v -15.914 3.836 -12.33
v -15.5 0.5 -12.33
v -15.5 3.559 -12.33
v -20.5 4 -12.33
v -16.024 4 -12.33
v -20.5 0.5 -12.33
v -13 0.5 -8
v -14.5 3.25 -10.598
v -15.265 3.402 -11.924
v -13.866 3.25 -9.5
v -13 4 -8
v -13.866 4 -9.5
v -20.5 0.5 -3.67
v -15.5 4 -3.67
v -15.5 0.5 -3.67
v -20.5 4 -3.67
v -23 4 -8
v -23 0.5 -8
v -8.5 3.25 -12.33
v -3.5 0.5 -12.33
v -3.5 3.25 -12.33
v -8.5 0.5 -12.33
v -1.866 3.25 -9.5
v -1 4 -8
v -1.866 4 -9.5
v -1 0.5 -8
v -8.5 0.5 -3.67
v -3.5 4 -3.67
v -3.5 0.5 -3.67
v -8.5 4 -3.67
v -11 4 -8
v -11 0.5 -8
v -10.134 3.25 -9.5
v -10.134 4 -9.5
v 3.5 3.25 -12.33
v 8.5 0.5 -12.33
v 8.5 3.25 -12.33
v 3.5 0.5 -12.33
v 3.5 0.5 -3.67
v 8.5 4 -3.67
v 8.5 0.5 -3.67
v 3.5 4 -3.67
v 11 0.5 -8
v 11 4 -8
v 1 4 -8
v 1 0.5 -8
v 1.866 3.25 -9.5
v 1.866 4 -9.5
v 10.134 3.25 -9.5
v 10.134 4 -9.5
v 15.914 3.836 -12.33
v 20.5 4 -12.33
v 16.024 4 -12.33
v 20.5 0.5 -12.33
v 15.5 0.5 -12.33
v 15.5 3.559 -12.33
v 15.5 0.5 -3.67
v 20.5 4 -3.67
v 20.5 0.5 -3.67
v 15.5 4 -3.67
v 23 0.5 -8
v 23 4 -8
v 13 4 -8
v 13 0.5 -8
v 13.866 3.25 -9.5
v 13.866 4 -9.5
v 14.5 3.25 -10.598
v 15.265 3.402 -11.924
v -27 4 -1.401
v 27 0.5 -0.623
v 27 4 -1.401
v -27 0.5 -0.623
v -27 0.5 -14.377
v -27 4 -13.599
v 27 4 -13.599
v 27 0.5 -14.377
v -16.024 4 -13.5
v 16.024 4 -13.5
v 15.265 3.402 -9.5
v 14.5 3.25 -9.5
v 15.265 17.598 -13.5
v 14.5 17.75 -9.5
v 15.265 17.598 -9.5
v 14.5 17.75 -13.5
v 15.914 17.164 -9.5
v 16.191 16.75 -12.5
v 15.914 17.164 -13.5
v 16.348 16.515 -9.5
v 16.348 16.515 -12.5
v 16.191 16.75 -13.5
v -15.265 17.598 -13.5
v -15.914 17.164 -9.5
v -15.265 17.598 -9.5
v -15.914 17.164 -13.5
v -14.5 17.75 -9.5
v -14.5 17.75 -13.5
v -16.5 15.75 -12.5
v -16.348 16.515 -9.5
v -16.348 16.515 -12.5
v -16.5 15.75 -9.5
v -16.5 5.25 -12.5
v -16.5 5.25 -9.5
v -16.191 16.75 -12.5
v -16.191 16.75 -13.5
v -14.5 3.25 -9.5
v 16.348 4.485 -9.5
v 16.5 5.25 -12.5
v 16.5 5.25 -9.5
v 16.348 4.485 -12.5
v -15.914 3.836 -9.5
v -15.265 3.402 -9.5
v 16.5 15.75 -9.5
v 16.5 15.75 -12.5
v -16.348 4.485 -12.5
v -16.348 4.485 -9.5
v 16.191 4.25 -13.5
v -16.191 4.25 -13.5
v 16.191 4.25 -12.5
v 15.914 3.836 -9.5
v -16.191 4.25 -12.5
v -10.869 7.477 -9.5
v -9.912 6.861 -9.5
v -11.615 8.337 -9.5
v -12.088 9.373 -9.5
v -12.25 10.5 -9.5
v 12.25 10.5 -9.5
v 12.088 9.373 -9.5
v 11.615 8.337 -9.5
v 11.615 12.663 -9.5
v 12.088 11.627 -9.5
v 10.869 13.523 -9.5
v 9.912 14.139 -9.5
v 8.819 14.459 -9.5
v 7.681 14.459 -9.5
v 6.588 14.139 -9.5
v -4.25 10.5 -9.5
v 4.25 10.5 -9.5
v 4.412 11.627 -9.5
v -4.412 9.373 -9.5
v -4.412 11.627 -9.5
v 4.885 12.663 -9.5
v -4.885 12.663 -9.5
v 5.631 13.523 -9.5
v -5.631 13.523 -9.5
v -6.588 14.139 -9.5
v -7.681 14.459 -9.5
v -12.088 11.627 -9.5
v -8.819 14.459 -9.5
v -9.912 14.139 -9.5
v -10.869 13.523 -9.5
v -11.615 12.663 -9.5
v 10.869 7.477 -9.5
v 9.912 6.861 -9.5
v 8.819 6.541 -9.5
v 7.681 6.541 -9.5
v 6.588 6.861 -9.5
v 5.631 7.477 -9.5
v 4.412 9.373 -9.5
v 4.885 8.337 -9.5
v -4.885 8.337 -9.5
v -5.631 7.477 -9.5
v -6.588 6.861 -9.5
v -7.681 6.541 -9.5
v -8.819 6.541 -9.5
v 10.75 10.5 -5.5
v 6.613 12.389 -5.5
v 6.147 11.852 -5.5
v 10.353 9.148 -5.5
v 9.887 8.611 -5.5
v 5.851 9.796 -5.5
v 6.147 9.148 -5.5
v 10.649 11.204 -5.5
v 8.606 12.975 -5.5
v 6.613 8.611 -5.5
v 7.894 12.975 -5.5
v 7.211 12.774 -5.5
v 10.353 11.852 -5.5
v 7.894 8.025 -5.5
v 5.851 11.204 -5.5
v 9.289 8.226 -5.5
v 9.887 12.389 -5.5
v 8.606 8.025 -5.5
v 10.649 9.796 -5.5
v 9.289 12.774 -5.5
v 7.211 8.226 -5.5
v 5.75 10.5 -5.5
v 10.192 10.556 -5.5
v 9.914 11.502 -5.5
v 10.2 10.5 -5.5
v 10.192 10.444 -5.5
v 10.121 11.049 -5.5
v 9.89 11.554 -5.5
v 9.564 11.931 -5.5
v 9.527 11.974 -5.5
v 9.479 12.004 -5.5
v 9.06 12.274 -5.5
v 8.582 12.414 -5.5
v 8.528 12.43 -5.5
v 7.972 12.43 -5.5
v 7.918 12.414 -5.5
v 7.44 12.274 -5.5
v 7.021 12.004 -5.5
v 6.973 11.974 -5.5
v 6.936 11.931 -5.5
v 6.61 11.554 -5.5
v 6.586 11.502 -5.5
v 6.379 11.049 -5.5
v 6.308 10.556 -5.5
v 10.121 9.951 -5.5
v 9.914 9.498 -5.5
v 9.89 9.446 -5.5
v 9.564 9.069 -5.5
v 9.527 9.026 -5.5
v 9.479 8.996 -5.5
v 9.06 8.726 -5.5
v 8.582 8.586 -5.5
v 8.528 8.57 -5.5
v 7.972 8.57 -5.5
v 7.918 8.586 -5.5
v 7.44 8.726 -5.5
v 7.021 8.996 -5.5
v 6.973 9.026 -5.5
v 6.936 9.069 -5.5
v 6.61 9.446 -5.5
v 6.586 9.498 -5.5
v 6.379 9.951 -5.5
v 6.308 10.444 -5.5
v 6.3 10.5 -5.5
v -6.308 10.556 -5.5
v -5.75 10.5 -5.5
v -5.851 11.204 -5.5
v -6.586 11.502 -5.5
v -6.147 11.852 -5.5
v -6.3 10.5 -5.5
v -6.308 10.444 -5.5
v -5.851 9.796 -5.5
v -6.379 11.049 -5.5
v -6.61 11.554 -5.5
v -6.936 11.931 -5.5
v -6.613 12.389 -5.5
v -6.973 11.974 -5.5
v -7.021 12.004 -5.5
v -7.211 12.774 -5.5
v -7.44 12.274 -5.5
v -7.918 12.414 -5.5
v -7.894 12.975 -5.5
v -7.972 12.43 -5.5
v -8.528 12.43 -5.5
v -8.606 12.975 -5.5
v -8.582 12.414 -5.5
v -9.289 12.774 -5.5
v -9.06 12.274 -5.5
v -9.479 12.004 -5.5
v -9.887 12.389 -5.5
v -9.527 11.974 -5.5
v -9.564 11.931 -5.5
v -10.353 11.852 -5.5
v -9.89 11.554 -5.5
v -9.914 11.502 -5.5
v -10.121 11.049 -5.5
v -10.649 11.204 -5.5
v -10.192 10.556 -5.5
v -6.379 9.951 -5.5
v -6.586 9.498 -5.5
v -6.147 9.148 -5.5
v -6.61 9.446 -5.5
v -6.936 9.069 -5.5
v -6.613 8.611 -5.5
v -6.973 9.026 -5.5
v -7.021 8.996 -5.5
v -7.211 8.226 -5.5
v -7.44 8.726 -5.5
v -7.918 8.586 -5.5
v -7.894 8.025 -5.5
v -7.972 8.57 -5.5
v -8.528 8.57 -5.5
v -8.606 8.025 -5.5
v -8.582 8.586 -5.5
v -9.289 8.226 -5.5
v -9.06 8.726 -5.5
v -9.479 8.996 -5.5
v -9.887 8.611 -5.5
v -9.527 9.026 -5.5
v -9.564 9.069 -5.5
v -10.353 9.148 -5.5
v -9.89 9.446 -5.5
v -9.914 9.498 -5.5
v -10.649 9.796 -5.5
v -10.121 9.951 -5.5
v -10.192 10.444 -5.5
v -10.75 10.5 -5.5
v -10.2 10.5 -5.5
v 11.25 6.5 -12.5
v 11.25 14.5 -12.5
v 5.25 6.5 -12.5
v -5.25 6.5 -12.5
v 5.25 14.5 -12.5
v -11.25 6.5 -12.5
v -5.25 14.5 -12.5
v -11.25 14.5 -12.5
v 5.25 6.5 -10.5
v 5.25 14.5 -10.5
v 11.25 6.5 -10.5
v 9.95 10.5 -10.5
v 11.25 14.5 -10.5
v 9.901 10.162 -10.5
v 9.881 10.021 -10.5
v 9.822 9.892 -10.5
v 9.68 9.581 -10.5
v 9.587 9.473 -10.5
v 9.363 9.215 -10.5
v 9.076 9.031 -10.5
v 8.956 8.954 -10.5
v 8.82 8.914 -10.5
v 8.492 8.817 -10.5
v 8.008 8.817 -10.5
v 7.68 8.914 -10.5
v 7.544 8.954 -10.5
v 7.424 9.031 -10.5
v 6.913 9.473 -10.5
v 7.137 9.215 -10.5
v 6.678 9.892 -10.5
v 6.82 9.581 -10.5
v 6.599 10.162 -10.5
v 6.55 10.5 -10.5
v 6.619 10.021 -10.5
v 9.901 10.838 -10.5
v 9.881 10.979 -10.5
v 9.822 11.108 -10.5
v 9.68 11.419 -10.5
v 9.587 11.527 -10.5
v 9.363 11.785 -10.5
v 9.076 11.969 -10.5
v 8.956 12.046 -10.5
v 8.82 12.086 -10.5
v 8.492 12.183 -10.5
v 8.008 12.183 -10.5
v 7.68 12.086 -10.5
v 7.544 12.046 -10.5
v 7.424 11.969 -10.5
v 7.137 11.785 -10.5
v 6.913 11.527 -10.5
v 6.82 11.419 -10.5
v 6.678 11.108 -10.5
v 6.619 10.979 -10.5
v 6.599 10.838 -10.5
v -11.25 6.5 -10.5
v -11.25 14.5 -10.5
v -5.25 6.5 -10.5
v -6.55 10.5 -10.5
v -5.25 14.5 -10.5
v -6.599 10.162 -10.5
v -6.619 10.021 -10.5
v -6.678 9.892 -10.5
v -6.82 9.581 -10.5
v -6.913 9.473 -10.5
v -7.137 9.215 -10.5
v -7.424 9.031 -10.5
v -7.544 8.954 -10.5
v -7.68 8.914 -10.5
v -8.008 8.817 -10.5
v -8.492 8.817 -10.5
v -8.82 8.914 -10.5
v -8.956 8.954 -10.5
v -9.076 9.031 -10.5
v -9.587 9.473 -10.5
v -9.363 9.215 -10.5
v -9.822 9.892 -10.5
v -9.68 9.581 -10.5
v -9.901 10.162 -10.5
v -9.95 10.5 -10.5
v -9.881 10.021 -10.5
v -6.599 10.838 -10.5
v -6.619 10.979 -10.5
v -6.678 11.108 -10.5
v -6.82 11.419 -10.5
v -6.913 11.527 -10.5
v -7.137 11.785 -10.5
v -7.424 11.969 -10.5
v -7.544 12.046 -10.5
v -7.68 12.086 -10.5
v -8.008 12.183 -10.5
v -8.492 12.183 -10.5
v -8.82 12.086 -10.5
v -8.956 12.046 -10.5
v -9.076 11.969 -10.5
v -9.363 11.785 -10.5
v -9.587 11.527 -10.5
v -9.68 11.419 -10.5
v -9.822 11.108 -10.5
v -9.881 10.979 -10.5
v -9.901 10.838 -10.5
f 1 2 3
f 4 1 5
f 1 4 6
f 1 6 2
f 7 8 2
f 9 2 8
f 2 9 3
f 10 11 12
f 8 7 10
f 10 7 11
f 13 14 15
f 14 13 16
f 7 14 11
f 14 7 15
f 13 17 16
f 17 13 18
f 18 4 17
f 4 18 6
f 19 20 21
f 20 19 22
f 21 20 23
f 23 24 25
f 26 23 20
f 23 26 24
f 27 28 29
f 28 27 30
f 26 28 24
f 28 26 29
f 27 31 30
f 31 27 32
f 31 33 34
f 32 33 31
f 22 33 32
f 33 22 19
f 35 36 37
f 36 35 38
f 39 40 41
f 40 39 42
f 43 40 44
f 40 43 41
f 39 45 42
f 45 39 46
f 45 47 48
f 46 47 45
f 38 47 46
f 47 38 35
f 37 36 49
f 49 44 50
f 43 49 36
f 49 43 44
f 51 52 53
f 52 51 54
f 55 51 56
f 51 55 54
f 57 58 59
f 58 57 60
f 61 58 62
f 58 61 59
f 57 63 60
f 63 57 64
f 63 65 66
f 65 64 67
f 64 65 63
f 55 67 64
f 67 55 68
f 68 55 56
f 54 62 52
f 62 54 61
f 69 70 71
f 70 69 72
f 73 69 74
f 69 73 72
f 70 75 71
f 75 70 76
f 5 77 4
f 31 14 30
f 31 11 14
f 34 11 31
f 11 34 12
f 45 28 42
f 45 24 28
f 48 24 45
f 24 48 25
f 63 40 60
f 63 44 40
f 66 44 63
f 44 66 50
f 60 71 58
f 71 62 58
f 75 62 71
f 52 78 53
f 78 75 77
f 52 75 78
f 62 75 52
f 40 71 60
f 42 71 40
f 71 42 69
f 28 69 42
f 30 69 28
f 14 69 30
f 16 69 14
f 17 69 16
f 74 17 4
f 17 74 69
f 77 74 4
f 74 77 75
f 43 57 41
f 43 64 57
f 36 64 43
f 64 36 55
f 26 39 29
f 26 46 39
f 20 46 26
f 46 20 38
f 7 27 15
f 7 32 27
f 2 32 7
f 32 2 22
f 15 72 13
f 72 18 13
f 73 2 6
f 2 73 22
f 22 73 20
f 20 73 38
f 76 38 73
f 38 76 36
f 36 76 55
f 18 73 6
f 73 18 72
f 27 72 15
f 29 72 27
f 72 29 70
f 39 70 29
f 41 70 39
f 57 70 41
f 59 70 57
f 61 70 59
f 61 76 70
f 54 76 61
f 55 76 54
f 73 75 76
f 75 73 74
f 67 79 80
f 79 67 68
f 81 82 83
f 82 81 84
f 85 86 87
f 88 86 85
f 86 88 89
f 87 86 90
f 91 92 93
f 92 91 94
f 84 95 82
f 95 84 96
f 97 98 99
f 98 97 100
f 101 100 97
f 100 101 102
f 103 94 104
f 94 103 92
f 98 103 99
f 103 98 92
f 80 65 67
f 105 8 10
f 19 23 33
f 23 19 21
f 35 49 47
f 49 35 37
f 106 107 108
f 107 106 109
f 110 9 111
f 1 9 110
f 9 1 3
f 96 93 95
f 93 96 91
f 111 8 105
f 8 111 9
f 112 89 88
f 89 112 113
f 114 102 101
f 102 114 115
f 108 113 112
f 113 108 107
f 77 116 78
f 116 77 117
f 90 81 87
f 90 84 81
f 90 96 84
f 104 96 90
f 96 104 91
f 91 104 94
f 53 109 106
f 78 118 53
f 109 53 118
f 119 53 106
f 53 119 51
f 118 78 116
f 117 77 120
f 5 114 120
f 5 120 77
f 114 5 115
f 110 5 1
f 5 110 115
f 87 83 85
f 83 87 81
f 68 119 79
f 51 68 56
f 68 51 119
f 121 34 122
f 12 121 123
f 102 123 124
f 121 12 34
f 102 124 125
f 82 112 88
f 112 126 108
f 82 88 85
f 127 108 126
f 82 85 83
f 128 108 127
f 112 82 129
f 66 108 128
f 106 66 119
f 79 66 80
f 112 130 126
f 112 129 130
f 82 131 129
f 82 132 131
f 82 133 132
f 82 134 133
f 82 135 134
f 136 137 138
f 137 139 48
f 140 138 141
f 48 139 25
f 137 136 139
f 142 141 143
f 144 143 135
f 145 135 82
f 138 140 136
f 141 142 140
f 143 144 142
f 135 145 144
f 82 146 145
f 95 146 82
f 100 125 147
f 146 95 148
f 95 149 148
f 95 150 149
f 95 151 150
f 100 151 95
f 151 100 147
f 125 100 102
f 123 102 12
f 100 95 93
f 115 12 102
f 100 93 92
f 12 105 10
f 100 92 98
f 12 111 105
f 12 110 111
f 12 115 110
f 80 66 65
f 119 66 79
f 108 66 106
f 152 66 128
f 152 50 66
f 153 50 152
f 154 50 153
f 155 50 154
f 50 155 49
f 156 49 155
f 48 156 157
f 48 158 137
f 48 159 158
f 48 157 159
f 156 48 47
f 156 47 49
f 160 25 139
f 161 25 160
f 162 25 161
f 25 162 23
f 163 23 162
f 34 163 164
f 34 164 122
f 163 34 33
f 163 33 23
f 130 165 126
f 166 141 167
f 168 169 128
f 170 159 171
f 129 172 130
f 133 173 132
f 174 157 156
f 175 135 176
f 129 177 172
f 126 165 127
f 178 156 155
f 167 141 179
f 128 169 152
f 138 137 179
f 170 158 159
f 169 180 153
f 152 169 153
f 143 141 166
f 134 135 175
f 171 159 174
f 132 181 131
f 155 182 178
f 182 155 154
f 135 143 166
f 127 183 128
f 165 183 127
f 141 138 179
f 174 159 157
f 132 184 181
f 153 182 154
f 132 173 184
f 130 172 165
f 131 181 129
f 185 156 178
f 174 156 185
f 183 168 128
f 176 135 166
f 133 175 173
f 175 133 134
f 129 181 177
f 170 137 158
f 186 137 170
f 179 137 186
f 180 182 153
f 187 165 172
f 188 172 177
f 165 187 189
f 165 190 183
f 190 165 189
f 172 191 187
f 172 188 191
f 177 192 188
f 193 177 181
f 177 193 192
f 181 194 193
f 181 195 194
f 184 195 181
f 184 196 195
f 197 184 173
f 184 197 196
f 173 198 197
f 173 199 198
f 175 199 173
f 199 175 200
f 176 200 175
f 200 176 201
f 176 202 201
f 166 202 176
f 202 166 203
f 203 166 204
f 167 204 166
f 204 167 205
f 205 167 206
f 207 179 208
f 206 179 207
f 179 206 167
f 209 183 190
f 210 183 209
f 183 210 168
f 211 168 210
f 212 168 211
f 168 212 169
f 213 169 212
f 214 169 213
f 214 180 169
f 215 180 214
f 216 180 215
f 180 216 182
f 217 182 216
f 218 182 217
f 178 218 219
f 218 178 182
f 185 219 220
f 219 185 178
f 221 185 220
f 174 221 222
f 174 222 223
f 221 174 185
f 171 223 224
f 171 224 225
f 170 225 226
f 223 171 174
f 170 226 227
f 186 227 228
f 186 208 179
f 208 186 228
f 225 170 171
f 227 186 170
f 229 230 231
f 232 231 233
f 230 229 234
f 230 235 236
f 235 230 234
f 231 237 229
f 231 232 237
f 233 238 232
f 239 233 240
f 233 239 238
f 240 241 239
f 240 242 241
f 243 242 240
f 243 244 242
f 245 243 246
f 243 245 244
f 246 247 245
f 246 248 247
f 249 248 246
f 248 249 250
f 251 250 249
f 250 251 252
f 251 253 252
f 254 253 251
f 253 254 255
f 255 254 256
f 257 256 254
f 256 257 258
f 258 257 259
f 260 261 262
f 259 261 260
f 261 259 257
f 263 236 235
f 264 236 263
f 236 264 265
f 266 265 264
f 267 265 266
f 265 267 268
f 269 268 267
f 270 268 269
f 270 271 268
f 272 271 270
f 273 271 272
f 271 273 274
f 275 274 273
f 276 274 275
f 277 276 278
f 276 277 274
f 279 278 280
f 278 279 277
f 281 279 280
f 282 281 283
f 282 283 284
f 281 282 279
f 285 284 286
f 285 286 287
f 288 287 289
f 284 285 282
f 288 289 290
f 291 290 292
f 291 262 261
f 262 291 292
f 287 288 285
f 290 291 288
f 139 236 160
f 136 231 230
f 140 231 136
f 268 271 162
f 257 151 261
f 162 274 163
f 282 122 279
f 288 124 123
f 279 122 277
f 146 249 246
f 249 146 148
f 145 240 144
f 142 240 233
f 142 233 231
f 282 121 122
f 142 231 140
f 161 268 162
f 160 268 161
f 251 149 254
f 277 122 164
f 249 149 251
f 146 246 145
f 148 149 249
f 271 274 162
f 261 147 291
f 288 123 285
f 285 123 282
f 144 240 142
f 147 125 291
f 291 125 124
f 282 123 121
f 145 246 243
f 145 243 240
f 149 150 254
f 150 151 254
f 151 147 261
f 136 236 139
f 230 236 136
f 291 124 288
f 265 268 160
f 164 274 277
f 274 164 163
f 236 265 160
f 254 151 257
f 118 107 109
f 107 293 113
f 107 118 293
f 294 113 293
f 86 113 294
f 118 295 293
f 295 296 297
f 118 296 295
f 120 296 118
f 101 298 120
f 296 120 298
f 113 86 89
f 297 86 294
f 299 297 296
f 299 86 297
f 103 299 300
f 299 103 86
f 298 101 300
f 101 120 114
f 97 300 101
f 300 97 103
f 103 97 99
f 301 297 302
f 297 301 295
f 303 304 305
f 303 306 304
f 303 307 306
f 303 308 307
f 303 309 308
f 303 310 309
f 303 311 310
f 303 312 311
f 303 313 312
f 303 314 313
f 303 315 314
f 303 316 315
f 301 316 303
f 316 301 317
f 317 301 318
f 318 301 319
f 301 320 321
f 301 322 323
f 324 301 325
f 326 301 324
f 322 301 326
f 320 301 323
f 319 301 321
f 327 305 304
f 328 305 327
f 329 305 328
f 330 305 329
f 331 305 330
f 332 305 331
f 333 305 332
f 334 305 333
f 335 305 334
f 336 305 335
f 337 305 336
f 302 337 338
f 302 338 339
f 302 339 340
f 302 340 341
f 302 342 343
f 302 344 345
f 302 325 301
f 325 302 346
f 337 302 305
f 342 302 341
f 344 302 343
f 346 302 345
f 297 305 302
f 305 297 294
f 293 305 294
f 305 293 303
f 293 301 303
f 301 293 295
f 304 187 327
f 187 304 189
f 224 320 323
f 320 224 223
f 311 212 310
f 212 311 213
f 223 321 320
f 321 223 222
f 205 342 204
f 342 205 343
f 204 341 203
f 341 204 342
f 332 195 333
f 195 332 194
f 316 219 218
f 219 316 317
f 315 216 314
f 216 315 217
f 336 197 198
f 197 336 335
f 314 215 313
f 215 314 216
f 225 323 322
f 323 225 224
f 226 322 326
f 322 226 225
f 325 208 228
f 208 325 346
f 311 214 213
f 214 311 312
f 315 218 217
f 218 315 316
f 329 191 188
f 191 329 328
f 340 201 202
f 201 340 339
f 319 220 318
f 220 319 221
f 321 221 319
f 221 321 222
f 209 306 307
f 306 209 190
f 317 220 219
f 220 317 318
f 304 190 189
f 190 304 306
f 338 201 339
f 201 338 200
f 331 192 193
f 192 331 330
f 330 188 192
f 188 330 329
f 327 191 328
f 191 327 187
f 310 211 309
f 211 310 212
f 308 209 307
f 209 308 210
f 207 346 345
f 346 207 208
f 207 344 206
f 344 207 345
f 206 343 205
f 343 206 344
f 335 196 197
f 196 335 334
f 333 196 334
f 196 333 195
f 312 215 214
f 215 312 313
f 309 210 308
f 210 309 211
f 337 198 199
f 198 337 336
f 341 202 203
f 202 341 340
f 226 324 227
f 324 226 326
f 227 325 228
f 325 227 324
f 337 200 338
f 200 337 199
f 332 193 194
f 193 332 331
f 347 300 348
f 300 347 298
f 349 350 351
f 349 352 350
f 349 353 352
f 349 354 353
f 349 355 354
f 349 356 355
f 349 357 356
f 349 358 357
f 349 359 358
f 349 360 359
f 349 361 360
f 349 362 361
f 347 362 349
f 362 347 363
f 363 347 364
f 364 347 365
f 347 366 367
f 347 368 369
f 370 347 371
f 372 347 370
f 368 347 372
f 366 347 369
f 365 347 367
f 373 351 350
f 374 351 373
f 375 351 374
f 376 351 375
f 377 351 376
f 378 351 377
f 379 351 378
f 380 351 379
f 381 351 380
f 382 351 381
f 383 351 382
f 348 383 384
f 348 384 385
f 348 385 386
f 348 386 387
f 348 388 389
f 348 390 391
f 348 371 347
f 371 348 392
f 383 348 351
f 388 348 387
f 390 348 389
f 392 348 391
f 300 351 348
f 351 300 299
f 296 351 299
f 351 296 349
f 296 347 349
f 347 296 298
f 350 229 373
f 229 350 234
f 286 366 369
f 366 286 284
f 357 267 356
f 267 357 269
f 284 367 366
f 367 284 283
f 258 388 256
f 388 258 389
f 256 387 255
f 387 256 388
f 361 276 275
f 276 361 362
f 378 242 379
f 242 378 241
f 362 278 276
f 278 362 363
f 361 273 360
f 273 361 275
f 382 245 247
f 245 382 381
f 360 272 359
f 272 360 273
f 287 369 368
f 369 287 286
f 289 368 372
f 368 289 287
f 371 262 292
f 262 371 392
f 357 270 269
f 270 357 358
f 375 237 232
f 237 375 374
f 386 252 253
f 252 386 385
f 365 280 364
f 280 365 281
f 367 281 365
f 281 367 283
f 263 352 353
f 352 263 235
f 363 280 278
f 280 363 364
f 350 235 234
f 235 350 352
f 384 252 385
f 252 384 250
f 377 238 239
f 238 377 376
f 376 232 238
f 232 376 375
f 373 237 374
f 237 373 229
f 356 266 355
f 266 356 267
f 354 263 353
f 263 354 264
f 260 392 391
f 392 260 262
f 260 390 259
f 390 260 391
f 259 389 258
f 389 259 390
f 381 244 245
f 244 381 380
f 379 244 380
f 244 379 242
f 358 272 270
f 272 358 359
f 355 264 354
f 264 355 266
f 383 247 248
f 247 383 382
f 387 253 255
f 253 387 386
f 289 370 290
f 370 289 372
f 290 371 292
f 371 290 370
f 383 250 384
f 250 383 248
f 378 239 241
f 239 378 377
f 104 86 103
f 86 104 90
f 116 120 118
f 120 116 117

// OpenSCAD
// BB-3c
// This is the mount for LED strip

tol=0.25;
extra=4;

    difference(){
    // Cutouts in the bottom outer rail to support fiber crossbar
        ps1=[ [0,0], [15,0], [14,4.5], [1,4.5] ];
        translate([-27,0,0]) rotate([0,90,0])
        linear_extrude(height=54) offset(r=-0.5) polygon(points=ps1);
i=0;
N=4;
    for(i=[0:1:N-1])
        translate([-18+12*i,0,-8]) 
        rotate([90,0,0]) cylinder(r=5,h=10,center=true,$fn=6);
}

        
translate([0,10.5,-13.5]) //rotate([-90,0,0])
difference(){
    union(){
        // Main bar
        linear_extrude(height=2,scale=1) 
        offset(r=2,$fn=16) offset(r=-2,$fn=16)
        square(size=[33,14.5],center=true);

        translate([0,0,2])    
        linear_extrude(height=2,scale=1) 
        offset(r=2,$fn=16) offset(r=-2,$fn=16)
        square(size=[33,14.5],center=true);
        
    translate([16.5/2,0,4]) cylinder(r1=4,r2=2.5,h=4,$fn=22);
    translate([-16.5/2,0,4]) cylinder(r1=4,r2=2.5,h=4,$fn=22);
    
    }
    
    // Channel for tape
    translate([0,0,0])
    linear_extrude(height=1) square(size=[54,12.5],center=true);
    
    // Cutouts for LED bodies
    translate([16.5/2,0,1]){
        linear_extrude(height=2) square(size=[6,8],center=true);
        cylinder(r1=1.6,r2=2,h=8,$fn=22);
    }

    translate([-16.5/2,0,1]){
        linear_extrude(height=2) square(size=[6,8],center=true);
        cylinder(r1=1.6,r2=2,h=8,$fn=22);
    }

}
/*
// Bar
    difference(){
    translate ([0,25,-11]) color("pink") 
        linear_extrude(height=3) 
        square(size=[54, 15]);
i=0;
N=4;
    for(i=[0:1:N-1])
        translate([9+12*i,32,-11]) 
        rotate([0,0,30]) cylinder(r=5,h=10,center=true,$fn=6);
}

/*
// add text for Version
translate ([16,43,3.5]) color("red") 
    linear_extrude(height=1.5){
    text("3C", font = "Open Sans:style=Bold", size=6,halign="center",valign="center",spacing=1.1);
    }

*/
